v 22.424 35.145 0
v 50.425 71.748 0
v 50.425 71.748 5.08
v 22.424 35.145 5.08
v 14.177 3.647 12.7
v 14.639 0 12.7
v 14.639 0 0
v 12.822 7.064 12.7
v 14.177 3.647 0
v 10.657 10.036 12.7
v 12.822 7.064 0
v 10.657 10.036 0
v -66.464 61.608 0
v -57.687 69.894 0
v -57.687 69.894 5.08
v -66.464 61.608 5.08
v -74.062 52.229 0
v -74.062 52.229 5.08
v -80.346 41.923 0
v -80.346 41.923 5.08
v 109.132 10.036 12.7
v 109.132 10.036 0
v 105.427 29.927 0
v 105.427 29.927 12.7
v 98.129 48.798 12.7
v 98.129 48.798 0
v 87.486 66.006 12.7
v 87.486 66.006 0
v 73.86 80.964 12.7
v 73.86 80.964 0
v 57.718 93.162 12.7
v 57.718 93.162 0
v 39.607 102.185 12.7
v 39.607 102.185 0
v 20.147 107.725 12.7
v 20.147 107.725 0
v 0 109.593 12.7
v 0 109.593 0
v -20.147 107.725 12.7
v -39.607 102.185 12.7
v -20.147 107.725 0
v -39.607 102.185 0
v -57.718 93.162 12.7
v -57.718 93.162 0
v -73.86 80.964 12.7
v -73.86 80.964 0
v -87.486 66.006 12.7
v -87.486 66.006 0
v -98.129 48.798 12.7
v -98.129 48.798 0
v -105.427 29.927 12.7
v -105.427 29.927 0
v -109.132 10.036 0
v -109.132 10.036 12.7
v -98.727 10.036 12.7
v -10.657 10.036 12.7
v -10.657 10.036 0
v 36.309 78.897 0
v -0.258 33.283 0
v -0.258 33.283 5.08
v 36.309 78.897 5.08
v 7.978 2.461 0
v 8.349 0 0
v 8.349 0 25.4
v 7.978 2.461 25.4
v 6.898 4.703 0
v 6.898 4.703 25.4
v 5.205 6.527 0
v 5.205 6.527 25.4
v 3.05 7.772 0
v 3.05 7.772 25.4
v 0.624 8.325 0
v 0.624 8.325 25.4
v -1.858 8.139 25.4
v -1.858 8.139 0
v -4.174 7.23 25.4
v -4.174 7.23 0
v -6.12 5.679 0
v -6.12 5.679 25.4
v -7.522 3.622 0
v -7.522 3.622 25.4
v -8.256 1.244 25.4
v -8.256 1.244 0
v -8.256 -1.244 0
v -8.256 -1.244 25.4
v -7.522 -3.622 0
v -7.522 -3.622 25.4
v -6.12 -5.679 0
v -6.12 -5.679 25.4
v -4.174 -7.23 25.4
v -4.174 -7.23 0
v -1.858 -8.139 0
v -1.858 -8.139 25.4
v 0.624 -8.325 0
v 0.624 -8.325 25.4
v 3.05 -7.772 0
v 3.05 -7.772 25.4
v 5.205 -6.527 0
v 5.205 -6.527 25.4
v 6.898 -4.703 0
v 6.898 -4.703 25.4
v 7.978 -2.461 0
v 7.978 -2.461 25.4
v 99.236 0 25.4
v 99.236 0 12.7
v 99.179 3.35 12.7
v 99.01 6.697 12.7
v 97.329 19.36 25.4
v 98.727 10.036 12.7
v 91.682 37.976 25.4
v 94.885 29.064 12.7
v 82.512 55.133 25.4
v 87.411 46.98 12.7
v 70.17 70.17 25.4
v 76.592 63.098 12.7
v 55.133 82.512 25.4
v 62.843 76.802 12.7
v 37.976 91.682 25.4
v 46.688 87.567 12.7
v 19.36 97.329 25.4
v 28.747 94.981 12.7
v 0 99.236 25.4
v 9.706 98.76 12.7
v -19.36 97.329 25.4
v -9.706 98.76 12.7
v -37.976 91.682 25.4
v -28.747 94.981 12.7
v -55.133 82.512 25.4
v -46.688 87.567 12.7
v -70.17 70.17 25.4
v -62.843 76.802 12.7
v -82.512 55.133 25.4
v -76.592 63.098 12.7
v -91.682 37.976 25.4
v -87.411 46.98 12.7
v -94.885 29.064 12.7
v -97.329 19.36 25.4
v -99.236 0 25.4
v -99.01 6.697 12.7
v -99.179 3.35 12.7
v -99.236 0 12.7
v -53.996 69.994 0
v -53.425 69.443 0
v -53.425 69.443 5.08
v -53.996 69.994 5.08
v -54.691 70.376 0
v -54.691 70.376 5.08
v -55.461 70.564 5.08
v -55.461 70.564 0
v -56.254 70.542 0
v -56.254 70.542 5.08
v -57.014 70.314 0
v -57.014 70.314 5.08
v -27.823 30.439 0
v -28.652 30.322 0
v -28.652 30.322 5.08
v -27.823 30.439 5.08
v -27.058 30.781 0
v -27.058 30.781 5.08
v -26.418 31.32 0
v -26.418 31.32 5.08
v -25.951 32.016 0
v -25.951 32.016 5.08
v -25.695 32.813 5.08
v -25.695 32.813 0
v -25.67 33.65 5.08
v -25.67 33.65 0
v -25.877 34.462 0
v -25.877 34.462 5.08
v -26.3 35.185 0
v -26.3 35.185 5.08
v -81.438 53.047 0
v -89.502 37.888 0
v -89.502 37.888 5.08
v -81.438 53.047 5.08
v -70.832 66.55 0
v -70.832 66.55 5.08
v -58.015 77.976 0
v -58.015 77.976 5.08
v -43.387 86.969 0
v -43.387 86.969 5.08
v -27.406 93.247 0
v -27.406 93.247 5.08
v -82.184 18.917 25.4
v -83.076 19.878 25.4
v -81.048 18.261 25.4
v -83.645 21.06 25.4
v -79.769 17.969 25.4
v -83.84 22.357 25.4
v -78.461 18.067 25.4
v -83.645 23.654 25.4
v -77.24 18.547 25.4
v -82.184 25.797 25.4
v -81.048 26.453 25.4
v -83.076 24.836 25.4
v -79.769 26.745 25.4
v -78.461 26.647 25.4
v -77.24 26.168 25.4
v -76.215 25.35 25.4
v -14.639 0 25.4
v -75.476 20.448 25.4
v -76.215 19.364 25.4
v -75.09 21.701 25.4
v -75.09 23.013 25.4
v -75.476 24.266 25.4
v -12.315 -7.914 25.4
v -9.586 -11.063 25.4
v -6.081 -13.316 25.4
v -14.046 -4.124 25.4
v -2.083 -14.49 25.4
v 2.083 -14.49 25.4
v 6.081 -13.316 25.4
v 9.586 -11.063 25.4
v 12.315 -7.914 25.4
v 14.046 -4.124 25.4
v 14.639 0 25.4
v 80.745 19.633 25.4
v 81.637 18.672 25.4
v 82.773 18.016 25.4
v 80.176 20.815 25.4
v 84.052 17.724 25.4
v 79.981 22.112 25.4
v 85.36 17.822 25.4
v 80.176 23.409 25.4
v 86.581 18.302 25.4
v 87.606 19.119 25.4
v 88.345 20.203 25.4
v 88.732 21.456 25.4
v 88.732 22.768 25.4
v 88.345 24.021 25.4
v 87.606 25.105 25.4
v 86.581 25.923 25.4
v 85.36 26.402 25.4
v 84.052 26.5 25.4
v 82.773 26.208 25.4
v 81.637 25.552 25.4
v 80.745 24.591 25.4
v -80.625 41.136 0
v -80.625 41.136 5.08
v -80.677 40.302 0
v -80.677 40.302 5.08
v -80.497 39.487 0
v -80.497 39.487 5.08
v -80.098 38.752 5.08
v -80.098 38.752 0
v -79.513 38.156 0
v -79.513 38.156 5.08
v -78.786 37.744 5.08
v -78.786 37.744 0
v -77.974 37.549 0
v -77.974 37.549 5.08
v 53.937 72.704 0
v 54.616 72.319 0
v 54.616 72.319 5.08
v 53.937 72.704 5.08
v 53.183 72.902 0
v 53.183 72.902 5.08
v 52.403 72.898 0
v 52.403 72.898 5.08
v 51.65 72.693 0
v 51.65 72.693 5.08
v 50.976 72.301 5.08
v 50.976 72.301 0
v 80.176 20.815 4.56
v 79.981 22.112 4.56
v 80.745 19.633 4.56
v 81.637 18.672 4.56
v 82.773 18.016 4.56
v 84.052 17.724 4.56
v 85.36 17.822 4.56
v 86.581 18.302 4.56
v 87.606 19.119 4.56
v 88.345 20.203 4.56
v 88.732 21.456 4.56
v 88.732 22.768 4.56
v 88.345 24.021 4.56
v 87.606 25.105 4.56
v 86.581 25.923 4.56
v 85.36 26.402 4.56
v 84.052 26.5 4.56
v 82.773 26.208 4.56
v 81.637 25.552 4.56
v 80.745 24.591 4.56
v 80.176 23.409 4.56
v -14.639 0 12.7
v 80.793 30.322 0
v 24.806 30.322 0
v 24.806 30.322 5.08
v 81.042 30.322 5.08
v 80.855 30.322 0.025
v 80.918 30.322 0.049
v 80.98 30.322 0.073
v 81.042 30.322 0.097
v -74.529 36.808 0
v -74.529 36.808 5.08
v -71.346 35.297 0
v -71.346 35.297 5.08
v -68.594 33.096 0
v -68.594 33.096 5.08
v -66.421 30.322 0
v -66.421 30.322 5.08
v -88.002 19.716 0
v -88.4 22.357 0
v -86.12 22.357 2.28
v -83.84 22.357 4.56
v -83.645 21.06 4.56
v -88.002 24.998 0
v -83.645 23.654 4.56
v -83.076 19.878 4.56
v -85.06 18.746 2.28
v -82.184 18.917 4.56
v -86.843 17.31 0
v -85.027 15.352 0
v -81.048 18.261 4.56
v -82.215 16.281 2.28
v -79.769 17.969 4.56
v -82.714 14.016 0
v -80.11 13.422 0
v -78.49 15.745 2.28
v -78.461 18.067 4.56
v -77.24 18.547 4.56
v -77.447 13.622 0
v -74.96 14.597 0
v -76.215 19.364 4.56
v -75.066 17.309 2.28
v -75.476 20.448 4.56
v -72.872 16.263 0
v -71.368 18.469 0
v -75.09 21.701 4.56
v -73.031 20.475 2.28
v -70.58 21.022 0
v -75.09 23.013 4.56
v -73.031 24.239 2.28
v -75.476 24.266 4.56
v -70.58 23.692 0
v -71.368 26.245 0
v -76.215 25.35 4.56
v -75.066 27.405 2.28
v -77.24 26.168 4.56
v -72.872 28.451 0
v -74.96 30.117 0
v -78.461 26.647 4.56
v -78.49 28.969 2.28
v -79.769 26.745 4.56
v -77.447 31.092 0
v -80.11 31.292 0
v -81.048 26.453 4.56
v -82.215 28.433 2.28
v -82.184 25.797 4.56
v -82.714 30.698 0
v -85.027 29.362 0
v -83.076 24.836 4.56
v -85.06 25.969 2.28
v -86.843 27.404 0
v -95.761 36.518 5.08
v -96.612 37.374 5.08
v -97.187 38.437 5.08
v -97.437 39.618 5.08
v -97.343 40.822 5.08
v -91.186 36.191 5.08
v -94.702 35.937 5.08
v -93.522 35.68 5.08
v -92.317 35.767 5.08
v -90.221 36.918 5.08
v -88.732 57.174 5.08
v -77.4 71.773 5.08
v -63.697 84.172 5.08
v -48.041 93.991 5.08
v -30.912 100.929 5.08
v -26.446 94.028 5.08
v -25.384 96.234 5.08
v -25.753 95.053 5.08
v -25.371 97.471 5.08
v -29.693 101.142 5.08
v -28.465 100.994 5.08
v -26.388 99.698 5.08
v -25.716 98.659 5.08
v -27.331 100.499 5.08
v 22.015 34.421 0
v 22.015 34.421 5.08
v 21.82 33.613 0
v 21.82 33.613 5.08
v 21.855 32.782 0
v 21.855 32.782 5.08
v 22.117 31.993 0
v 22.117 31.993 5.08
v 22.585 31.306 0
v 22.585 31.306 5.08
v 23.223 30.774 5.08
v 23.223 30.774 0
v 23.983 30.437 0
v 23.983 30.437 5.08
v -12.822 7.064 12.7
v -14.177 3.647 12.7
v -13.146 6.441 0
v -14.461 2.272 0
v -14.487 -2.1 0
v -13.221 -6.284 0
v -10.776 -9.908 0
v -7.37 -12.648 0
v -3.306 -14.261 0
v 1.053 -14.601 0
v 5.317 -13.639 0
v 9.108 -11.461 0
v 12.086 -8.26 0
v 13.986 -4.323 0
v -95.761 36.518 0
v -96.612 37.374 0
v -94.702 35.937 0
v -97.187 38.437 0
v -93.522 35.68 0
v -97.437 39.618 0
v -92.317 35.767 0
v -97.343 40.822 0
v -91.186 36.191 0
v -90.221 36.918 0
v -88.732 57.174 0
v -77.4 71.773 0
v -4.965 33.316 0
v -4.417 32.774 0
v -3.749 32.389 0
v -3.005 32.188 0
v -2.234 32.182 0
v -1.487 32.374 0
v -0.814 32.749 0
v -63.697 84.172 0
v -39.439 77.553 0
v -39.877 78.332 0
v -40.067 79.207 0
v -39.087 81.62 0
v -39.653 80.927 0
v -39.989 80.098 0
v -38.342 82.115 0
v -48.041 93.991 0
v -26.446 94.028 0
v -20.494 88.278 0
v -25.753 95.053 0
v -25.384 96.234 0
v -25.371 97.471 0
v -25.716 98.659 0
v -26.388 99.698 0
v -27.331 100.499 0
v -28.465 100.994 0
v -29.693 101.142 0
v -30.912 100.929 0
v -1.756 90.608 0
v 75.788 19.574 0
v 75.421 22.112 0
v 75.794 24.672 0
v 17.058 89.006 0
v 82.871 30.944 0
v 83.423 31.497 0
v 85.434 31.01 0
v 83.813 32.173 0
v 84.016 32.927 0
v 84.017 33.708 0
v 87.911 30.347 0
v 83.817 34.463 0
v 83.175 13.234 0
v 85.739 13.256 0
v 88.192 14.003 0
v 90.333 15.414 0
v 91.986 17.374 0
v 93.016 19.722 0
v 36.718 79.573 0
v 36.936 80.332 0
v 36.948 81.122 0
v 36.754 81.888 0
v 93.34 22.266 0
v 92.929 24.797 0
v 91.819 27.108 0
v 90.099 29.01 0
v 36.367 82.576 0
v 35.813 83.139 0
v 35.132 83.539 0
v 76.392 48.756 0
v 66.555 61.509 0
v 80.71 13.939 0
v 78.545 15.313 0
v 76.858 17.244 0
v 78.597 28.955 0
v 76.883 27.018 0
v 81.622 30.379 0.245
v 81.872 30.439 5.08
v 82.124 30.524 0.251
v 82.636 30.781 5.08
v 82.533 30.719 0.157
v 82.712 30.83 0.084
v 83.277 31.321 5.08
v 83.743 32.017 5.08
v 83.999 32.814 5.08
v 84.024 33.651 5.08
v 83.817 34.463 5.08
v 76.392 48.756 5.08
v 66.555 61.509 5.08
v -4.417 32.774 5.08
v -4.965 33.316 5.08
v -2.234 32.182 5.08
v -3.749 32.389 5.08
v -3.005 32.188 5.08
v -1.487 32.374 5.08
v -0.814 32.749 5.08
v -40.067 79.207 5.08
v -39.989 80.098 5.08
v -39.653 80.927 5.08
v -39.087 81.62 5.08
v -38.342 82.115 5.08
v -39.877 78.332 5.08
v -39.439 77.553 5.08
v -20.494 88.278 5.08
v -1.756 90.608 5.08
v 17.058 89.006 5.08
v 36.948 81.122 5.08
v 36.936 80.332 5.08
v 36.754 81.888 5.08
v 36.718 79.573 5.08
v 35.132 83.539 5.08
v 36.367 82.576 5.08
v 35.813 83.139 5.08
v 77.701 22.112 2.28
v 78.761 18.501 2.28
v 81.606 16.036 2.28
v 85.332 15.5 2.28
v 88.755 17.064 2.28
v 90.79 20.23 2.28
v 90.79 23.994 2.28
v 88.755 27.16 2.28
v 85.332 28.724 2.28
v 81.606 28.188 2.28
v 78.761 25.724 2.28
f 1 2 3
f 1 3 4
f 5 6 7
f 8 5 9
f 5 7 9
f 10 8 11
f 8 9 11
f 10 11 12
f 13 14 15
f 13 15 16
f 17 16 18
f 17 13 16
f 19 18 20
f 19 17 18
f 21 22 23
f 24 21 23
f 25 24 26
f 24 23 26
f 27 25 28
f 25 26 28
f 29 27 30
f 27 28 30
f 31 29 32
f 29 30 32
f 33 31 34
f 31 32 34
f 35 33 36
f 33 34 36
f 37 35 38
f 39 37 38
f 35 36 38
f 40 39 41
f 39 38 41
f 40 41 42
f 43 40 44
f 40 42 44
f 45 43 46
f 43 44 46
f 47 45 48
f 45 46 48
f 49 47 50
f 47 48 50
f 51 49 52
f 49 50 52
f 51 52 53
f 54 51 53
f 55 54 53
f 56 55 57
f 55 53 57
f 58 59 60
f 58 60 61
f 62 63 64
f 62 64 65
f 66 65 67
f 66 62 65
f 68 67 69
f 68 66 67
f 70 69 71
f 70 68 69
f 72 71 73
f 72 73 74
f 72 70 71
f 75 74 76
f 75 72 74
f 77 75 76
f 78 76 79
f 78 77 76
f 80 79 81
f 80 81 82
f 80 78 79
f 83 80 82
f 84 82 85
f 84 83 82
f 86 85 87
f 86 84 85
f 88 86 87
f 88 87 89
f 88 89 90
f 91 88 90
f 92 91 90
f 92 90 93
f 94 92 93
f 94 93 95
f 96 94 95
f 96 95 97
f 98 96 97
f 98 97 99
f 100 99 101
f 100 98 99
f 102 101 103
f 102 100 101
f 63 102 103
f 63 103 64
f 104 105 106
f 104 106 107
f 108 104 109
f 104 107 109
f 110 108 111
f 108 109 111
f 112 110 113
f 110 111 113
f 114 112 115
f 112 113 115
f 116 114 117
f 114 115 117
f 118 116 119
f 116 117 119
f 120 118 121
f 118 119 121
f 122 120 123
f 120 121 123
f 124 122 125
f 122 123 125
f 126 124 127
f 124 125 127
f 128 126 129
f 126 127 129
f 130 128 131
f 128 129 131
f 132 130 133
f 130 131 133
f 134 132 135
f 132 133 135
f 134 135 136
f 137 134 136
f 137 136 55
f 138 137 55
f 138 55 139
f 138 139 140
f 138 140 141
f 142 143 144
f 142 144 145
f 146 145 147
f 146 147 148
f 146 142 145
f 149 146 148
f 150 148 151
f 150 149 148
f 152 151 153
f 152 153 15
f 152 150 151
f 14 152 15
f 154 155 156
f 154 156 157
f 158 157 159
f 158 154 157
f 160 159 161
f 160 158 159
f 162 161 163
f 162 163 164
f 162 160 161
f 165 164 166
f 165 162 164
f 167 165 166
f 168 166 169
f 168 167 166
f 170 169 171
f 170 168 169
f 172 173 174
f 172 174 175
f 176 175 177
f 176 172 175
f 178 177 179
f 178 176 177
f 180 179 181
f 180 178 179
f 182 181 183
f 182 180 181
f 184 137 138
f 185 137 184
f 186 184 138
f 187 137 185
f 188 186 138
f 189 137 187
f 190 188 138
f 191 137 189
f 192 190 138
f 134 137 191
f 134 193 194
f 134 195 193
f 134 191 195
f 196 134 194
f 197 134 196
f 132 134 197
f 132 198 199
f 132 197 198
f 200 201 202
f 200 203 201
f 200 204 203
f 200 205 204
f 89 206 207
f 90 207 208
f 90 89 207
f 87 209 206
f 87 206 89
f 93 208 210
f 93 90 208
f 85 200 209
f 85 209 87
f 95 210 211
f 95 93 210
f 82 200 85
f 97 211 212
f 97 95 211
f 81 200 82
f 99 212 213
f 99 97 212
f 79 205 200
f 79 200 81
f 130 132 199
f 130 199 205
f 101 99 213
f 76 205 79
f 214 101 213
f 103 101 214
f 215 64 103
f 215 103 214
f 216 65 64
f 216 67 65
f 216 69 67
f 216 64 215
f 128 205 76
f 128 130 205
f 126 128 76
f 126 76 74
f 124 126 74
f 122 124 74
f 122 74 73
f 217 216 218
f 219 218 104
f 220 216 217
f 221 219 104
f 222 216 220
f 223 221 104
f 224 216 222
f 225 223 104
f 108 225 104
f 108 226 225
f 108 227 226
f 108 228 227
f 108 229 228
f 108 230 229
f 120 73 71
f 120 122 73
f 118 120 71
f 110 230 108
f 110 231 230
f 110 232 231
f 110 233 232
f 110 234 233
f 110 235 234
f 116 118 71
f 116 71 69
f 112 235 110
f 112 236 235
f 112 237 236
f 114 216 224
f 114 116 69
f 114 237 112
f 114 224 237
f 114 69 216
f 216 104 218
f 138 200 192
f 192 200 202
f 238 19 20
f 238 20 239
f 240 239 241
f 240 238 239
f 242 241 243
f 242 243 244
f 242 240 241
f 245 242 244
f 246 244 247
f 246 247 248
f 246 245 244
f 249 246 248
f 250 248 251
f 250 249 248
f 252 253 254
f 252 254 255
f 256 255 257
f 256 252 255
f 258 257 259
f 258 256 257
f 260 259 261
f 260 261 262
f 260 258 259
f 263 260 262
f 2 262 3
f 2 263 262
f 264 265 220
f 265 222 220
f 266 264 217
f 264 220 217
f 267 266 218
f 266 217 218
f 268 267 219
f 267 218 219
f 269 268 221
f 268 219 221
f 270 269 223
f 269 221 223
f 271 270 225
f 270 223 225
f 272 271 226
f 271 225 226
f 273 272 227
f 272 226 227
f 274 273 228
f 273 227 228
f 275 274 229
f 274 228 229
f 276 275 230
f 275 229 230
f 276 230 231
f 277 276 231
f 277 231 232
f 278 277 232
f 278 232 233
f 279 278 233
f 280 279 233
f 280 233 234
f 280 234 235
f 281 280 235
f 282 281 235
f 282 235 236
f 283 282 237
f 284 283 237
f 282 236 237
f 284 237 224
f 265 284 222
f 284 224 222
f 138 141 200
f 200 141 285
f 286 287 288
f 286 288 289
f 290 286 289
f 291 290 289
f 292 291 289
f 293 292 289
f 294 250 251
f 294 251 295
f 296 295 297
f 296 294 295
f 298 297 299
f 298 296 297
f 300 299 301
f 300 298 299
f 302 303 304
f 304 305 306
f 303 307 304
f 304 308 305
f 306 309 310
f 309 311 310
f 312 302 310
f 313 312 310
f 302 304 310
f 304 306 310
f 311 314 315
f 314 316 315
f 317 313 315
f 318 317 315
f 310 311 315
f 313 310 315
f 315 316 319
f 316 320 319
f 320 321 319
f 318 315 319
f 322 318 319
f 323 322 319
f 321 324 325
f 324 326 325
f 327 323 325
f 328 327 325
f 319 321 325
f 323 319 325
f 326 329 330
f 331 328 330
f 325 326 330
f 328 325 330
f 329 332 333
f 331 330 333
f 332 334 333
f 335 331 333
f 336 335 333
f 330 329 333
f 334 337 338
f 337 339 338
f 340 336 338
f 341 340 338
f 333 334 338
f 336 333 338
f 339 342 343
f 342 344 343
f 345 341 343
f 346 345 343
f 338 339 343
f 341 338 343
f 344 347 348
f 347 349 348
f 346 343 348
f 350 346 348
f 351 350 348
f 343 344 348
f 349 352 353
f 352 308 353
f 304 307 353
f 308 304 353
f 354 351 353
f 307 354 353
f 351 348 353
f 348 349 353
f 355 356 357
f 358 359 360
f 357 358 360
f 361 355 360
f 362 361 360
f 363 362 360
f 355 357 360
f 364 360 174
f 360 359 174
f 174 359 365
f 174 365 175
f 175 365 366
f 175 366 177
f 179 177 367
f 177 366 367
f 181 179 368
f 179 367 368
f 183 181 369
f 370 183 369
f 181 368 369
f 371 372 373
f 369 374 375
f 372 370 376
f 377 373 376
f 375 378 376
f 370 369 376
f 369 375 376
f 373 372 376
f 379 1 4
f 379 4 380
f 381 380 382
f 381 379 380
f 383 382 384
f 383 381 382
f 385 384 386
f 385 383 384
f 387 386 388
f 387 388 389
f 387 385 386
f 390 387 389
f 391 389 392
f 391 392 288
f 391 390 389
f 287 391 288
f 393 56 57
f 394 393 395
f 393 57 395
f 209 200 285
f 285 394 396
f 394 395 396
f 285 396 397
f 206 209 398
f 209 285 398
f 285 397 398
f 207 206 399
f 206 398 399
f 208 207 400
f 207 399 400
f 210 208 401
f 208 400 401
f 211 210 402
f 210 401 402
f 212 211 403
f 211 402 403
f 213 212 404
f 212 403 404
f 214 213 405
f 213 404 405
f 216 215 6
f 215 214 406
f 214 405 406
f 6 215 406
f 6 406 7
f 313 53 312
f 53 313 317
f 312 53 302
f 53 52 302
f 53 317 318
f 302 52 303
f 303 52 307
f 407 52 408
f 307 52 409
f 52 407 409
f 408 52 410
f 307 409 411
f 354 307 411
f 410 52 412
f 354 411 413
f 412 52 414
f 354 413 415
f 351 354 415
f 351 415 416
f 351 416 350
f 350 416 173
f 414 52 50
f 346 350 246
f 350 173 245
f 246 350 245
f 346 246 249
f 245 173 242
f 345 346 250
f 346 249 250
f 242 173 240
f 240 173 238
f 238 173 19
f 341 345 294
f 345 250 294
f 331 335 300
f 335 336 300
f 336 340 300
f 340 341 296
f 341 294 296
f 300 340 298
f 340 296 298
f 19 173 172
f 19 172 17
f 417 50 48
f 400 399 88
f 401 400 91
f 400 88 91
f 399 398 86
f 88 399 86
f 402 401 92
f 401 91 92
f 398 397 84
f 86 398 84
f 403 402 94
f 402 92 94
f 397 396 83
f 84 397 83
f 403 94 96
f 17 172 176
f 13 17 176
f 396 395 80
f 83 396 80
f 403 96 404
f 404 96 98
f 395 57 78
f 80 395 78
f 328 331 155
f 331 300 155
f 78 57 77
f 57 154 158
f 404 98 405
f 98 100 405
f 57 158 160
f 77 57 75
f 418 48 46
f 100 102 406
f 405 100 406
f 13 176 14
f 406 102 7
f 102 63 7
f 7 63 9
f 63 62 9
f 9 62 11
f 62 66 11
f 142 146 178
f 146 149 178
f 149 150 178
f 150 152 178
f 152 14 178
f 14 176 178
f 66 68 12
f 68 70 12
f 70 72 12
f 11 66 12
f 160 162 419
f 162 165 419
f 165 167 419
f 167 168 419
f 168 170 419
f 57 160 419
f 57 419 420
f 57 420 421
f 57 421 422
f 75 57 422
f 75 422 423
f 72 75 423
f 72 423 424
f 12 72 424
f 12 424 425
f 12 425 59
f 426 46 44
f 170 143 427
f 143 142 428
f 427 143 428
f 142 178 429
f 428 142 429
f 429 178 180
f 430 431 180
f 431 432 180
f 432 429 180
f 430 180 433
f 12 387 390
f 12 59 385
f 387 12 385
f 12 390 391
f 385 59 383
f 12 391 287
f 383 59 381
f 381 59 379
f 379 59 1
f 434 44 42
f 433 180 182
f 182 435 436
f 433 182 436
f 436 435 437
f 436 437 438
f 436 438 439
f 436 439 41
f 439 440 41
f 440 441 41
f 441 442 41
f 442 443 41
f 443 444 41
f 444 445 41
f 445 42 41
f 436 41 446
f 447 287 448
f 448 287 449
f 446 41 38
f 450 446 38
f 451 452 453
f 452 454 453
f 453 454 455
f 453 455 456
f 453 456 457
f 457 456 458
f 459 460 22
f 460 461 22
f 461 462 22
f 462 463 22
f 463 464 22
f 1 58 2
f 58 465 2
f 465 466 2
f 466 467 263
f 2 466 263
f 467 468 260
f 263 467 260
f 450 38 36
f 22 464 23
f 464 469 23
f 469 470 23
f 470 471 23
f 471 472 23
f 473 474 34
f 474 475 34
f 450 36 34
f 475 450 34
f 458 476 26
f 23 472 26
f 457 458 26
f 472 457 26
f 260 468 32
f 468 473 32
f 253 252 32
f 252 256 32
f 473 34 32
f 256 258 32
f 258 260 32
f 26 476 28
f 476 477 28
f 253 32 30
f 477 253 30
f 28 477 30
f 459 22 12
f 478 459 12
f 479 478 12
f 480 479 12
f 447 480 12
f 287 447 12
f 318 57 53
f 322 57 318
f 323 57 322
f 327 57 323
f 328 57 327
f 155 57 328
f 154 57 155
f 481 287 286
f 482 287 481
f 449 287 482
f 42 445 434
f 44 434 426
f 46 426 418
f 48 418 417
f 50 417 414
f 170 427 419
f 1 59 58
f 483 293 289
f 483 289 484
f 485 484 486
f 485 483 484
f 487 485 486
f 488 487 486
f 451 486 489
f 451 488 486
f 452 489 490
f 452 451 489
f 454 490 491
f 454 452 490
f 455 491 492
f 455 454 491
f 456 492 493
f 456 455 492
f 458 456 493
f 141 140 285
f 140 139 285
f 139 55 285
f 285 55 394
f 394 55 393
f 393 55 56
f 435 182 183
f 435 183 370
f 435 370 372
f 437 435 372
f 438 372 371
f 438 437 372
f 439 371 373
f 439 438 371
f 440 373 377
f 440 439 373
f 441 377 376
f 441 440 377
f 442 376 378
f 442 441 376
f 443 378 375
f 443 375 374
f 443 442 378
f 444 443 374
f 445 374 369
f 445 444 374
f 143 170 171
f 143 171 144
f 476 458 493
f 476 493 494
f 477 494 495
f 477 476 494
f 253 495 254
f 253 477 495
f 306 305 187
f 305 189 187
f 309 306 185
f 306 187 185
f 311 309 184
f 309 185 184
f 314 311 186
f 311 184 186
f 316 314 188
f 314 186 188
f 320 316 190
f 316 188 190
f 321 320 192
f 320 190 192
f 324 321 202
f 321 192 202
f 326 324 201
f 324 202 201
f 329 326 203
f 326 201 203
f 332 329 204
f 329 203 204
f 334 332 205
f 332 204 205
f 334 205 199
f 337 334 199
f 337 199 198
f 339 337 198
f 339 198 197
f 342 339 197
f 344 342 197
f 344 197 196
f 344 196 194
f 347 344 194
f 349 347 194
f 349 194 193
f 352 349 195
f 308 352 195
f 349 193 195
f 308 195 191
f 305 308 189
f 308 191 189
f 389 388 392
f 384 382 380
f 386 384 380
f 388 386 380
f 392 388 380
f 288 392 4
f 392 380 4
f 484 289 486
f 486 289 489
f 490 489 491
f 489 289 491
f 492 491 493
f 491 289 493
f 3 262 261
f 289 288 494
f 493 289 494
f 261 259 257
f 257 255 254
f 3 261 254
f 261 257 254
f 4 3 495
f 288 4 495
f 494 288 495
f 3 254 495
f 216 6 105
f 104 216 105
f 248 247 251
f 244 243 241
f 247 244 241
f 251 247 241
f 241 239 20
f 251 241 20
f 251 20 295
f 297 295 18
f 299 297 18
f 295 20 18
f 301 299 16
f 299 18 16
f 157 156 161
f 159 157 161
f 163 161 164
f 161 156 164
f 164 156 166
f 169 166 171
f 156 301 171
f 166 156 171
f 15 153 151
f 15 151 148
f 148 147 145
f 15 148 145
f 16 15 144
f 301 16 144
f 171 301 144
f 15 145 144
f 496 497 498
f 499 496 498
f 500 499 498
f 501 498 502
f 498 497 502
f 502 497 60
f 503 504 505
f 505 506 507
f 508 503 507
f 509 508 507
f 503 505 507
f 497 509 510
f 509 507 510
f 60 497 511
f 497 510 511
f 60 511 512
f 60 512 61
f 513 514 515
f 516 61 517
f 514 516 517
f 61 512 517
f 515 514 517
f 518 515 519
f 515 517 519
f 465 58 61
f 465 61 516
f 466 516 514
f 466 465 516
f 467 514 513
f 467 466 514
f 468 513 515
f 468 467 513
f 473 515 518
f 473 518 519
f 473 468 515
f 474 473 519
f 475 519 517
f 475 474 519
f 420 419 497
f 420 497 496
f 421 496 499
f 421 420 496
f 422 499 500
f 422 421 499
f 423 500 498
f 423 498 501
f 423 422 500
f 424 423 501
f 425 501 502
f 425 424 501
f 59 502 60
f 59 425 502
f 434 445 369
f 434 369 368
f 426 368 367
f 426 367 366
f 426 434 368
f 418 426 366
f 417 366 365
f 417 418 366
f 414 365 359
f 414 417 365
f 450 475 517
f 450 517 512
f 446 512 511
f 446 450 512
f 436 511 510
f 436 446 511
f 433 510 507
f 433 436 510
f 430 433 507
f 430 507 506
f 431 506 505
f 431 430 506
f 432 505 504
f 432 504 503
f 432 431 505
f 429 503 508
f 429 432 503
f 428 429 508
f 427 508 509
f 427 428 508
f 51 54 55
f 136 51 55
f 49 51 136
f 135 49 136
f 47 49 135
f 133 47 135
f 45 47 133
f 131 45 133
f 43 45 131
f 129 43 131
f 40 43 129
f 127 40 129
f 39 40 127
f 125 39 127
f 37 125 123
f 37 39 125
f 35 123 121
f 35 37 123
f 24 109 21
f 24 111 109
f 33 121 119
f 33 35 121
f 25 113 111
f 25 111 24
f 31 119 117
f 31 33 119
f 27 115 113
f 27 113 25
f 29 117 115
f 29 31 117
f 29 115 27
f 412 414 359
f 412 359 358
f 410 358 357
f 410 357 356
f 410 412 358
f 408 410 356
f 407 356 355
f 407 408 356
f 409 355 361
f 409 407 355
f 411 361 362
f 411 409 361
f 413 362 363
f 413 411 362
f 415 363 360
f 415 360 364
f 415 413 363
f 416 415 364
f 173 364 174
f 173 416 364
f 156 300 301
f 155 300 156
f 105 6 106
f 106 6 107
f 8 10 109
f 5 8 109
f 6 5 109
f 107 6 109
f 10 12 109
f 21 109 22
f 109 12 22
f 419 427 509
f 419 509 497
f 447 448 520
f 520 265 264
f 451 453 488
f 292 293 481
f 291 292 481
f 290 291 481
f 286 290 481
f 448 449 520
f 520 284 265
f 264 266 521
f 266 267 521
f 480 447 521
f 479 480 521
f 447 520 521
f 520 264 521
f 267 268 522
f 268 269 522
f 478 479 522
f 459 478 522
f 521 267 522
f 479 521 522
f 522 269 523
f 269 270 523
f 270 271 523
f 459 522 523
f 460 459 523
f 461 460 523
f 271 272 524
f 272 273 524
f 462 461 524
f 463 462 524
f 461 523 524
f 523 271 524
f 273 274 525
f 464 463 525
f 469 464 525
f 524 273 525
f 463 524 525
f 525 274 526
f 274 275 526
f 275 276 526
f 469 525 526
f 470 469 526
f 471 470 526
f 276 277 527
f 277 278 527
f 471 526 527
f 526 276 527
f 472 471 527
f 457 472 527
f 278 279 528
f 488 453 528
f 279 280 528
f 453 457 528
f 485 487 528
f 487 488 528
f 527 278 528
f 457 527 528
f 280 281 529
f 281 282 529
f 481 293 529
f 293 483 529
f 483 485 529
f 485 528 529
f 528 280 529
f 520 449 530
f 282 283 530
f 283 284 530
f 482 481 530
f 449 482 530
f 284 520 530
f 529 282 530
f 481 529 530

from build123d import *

# Parameters (mm, degrees)
F1_DEPTH        = 12.7
F3_DEPTH        = 25.4
F4_W            = 242.7691146731
F4_H            = 30.0364848226
F5_DEPTH        = 12.7
F6_R            = 14.6387815084
F7_DEPTH        = 25.4
F8_R            = 8.3487757397
F9_DEPTH        = 25.4
F11_DEPTH       = 5.08
F13_DEPTH       = 5.08
F15_D           = 8.8
F15_CSINK_D     = 17.92
F15_CSINK_ANGLE = 90


with BuildPart() as f1:
    # F0 (on Top) → F1 (new body)
    with BuildSketch(Plane.XY):
        with BuildLine():
            Line((-109.5926865071, 0), (109.5926865071, 0))
            ThreePointArc((109.5926865071, 0), (0, 109.5926865071), (-109.5926865071, 0))
        make_face()
    extrude(amount=F1_DEPTH)

    # F2 (on Top) → F3 (join)
    with BuildSketch(Plane.XY):
        with BuildLine():
            Line((-99.2360358279, 0), (99.2360358279, 0))
            ThreePointArc((99.2360358279, 0), (0, 99.2360358279), (-99.2360358279, 0))
        make_face()
    extrude(amount=F3_DEPTH)

    # F4 (on Top) → F5 (cut)
    with BuildSketch(Plane.XY):
        with Locations((-4.4899918139, -4.9826959148)):
            Rectangle(F4_W, F4_H)
    extrude(amount=F5_DEPTH, mode=Mode.SUBTRACT)

    # F6 (on Top) → F7 (join)
    with BuildSketch(Plane.XY):
        Circle(F6_R)
    extrude(amount=F7_DEPTH)

    # F8 (on Top) → F9 (cut)
    with BuildSketch(Plane.XY):
        Circle(F8_R)
    extrude(amount=F9_DEPTH, mode=Mode.SUBTRACT)

    # F10 (on Top) → F11 (cut)
    with BuildSketch(Plane.XY):
        with BuildLine():
            ThreePointArc((81.0422290099, 30.3221999213), (83.5344690722, 31.6522479843), (83.8168430896, 34.4630402733))
            ThreePointArc((83.8168430896, 34.4630402733), (71.7577369395, 55.3515268057), (54.6157974615, 72.3192851046))
            ThreePointArc((54.6157974615, 72.3192851046), (52.4026696923, 72.89779249), (50.4251048932, 71.7480782719))
            Line((50.4251048932, 71.7480782719), (22.4235640904, 35.1450000601))
            ThreePointArc((22.4235640904, 35.1450000601), (22.1166466893, 31.9933659242), (24.806293545, 30.3221999213))
            Line((24.806293545, 30.3221999213), (81.0422290099, 30.3221999213))
        make_face()
        with BuildLine():
            ThreePointArc((-4.9650533663, 33.315884659), (-2.6194064658, 32.1600273833), (-0.2580637548, 33.2834712068))
            Line((-0.2580637548, 33.2834712068), (36.3094015687, 78.8968902074))
            ThreePointArc((36.3094015687, 78.8968902074), (36.8765863049, 81.5111398441), (35.1316920138, 83.538784685))
            ThreePointArc((35.1316920138, 83.538784685), (-1.7558791181, 90.6083948589), (-38.3418575582, 82.1149577688))
            ThreePointArc((-38.3418575582, 82.1149577688), (-39.9894725562, 80.0980697861), (-39.4389206806, 77.5526101127))
            Line((-39.4389206806, 77.5526101127), (-4.9650533663, 33.315884659))
        make_face()
        with BuildLine():
            ThreePointArc((-28.6519128364, 30.3221999213), (-25.9512730857, 32.0158519826), (-26.2999293888, 35.1845032967))
            Line((-26.2999293888, 35.1845032967), (-53.425476113, 69.442529))
            ThreePointArc((-53.425476113, 69.442529), (-55.4614488813, 70.5635354057), (-57.6870926805, 69.8939458642))
            ThreePointArc((-57.6870926805, 69.8939458642), (-70.419089982, 57.0448603864), (-80.3456057092, 41.9231197982))
            ThreePointArc((-80.3456057092, 41.9231197982), (-80.3231983412, 39.1054090847), (-77.9741099322, 37.5492023498))
            ThreePointArc((-77.9741099322, 37.5492023498), (-71.346139634, 35.2966967191), (-66.4208829403, 30.3221999213))
            Line((-66.4208829403, 30.3221999213), (-28.6519128364, 30.3221999213))
        make_face()
    extrude(amount=F11_DEPTH, mode=Mode.SUBTRACT)

    # F12 (on Top) → F13 (cut)
    with BuildSketch(Plane.XY):
        with BuildLine():
            ThreePointArc((-89.5017917801, 37.8877817543), (-64.6761122502, 72.5469175245), (-27.4057276817, 93.2468810649))
            ThreePointArc((-27.4057276817, 93.2468810649), (-25.7155974631, 98.6594259136), (-30.9120716898, 100.9285309146))
            ThreePointArc((-30.9120716898, 100.9285309146), (-70.8203505983, 78.2726163475), (-97.3429498314, 40.8224772259))
            ThreePointArc((-97.3429498314, 40.8224772259), (-94.7015703839, 35.937260015), (-89.5017917801, 37.8877817543))
        make_face()
    extrude(amount=F13_DEPTH, mode=Mode.SUBTRACT)

    # F15 (through all)
    with Locations(Plane(origin=(0, 0, 0), x_dir=(1, 0, 0), z_dir=(0, 0, -1))):
        with Locations((84.3808501959, -22.1120715141), (-79.4403954111, -22.3570616146)):
            CounterSinkHole(F15_D / 2, F15_CSINK_D / 2, counter_sink_angle=F15_CSINK_ANGLE)


solid = f1.part
